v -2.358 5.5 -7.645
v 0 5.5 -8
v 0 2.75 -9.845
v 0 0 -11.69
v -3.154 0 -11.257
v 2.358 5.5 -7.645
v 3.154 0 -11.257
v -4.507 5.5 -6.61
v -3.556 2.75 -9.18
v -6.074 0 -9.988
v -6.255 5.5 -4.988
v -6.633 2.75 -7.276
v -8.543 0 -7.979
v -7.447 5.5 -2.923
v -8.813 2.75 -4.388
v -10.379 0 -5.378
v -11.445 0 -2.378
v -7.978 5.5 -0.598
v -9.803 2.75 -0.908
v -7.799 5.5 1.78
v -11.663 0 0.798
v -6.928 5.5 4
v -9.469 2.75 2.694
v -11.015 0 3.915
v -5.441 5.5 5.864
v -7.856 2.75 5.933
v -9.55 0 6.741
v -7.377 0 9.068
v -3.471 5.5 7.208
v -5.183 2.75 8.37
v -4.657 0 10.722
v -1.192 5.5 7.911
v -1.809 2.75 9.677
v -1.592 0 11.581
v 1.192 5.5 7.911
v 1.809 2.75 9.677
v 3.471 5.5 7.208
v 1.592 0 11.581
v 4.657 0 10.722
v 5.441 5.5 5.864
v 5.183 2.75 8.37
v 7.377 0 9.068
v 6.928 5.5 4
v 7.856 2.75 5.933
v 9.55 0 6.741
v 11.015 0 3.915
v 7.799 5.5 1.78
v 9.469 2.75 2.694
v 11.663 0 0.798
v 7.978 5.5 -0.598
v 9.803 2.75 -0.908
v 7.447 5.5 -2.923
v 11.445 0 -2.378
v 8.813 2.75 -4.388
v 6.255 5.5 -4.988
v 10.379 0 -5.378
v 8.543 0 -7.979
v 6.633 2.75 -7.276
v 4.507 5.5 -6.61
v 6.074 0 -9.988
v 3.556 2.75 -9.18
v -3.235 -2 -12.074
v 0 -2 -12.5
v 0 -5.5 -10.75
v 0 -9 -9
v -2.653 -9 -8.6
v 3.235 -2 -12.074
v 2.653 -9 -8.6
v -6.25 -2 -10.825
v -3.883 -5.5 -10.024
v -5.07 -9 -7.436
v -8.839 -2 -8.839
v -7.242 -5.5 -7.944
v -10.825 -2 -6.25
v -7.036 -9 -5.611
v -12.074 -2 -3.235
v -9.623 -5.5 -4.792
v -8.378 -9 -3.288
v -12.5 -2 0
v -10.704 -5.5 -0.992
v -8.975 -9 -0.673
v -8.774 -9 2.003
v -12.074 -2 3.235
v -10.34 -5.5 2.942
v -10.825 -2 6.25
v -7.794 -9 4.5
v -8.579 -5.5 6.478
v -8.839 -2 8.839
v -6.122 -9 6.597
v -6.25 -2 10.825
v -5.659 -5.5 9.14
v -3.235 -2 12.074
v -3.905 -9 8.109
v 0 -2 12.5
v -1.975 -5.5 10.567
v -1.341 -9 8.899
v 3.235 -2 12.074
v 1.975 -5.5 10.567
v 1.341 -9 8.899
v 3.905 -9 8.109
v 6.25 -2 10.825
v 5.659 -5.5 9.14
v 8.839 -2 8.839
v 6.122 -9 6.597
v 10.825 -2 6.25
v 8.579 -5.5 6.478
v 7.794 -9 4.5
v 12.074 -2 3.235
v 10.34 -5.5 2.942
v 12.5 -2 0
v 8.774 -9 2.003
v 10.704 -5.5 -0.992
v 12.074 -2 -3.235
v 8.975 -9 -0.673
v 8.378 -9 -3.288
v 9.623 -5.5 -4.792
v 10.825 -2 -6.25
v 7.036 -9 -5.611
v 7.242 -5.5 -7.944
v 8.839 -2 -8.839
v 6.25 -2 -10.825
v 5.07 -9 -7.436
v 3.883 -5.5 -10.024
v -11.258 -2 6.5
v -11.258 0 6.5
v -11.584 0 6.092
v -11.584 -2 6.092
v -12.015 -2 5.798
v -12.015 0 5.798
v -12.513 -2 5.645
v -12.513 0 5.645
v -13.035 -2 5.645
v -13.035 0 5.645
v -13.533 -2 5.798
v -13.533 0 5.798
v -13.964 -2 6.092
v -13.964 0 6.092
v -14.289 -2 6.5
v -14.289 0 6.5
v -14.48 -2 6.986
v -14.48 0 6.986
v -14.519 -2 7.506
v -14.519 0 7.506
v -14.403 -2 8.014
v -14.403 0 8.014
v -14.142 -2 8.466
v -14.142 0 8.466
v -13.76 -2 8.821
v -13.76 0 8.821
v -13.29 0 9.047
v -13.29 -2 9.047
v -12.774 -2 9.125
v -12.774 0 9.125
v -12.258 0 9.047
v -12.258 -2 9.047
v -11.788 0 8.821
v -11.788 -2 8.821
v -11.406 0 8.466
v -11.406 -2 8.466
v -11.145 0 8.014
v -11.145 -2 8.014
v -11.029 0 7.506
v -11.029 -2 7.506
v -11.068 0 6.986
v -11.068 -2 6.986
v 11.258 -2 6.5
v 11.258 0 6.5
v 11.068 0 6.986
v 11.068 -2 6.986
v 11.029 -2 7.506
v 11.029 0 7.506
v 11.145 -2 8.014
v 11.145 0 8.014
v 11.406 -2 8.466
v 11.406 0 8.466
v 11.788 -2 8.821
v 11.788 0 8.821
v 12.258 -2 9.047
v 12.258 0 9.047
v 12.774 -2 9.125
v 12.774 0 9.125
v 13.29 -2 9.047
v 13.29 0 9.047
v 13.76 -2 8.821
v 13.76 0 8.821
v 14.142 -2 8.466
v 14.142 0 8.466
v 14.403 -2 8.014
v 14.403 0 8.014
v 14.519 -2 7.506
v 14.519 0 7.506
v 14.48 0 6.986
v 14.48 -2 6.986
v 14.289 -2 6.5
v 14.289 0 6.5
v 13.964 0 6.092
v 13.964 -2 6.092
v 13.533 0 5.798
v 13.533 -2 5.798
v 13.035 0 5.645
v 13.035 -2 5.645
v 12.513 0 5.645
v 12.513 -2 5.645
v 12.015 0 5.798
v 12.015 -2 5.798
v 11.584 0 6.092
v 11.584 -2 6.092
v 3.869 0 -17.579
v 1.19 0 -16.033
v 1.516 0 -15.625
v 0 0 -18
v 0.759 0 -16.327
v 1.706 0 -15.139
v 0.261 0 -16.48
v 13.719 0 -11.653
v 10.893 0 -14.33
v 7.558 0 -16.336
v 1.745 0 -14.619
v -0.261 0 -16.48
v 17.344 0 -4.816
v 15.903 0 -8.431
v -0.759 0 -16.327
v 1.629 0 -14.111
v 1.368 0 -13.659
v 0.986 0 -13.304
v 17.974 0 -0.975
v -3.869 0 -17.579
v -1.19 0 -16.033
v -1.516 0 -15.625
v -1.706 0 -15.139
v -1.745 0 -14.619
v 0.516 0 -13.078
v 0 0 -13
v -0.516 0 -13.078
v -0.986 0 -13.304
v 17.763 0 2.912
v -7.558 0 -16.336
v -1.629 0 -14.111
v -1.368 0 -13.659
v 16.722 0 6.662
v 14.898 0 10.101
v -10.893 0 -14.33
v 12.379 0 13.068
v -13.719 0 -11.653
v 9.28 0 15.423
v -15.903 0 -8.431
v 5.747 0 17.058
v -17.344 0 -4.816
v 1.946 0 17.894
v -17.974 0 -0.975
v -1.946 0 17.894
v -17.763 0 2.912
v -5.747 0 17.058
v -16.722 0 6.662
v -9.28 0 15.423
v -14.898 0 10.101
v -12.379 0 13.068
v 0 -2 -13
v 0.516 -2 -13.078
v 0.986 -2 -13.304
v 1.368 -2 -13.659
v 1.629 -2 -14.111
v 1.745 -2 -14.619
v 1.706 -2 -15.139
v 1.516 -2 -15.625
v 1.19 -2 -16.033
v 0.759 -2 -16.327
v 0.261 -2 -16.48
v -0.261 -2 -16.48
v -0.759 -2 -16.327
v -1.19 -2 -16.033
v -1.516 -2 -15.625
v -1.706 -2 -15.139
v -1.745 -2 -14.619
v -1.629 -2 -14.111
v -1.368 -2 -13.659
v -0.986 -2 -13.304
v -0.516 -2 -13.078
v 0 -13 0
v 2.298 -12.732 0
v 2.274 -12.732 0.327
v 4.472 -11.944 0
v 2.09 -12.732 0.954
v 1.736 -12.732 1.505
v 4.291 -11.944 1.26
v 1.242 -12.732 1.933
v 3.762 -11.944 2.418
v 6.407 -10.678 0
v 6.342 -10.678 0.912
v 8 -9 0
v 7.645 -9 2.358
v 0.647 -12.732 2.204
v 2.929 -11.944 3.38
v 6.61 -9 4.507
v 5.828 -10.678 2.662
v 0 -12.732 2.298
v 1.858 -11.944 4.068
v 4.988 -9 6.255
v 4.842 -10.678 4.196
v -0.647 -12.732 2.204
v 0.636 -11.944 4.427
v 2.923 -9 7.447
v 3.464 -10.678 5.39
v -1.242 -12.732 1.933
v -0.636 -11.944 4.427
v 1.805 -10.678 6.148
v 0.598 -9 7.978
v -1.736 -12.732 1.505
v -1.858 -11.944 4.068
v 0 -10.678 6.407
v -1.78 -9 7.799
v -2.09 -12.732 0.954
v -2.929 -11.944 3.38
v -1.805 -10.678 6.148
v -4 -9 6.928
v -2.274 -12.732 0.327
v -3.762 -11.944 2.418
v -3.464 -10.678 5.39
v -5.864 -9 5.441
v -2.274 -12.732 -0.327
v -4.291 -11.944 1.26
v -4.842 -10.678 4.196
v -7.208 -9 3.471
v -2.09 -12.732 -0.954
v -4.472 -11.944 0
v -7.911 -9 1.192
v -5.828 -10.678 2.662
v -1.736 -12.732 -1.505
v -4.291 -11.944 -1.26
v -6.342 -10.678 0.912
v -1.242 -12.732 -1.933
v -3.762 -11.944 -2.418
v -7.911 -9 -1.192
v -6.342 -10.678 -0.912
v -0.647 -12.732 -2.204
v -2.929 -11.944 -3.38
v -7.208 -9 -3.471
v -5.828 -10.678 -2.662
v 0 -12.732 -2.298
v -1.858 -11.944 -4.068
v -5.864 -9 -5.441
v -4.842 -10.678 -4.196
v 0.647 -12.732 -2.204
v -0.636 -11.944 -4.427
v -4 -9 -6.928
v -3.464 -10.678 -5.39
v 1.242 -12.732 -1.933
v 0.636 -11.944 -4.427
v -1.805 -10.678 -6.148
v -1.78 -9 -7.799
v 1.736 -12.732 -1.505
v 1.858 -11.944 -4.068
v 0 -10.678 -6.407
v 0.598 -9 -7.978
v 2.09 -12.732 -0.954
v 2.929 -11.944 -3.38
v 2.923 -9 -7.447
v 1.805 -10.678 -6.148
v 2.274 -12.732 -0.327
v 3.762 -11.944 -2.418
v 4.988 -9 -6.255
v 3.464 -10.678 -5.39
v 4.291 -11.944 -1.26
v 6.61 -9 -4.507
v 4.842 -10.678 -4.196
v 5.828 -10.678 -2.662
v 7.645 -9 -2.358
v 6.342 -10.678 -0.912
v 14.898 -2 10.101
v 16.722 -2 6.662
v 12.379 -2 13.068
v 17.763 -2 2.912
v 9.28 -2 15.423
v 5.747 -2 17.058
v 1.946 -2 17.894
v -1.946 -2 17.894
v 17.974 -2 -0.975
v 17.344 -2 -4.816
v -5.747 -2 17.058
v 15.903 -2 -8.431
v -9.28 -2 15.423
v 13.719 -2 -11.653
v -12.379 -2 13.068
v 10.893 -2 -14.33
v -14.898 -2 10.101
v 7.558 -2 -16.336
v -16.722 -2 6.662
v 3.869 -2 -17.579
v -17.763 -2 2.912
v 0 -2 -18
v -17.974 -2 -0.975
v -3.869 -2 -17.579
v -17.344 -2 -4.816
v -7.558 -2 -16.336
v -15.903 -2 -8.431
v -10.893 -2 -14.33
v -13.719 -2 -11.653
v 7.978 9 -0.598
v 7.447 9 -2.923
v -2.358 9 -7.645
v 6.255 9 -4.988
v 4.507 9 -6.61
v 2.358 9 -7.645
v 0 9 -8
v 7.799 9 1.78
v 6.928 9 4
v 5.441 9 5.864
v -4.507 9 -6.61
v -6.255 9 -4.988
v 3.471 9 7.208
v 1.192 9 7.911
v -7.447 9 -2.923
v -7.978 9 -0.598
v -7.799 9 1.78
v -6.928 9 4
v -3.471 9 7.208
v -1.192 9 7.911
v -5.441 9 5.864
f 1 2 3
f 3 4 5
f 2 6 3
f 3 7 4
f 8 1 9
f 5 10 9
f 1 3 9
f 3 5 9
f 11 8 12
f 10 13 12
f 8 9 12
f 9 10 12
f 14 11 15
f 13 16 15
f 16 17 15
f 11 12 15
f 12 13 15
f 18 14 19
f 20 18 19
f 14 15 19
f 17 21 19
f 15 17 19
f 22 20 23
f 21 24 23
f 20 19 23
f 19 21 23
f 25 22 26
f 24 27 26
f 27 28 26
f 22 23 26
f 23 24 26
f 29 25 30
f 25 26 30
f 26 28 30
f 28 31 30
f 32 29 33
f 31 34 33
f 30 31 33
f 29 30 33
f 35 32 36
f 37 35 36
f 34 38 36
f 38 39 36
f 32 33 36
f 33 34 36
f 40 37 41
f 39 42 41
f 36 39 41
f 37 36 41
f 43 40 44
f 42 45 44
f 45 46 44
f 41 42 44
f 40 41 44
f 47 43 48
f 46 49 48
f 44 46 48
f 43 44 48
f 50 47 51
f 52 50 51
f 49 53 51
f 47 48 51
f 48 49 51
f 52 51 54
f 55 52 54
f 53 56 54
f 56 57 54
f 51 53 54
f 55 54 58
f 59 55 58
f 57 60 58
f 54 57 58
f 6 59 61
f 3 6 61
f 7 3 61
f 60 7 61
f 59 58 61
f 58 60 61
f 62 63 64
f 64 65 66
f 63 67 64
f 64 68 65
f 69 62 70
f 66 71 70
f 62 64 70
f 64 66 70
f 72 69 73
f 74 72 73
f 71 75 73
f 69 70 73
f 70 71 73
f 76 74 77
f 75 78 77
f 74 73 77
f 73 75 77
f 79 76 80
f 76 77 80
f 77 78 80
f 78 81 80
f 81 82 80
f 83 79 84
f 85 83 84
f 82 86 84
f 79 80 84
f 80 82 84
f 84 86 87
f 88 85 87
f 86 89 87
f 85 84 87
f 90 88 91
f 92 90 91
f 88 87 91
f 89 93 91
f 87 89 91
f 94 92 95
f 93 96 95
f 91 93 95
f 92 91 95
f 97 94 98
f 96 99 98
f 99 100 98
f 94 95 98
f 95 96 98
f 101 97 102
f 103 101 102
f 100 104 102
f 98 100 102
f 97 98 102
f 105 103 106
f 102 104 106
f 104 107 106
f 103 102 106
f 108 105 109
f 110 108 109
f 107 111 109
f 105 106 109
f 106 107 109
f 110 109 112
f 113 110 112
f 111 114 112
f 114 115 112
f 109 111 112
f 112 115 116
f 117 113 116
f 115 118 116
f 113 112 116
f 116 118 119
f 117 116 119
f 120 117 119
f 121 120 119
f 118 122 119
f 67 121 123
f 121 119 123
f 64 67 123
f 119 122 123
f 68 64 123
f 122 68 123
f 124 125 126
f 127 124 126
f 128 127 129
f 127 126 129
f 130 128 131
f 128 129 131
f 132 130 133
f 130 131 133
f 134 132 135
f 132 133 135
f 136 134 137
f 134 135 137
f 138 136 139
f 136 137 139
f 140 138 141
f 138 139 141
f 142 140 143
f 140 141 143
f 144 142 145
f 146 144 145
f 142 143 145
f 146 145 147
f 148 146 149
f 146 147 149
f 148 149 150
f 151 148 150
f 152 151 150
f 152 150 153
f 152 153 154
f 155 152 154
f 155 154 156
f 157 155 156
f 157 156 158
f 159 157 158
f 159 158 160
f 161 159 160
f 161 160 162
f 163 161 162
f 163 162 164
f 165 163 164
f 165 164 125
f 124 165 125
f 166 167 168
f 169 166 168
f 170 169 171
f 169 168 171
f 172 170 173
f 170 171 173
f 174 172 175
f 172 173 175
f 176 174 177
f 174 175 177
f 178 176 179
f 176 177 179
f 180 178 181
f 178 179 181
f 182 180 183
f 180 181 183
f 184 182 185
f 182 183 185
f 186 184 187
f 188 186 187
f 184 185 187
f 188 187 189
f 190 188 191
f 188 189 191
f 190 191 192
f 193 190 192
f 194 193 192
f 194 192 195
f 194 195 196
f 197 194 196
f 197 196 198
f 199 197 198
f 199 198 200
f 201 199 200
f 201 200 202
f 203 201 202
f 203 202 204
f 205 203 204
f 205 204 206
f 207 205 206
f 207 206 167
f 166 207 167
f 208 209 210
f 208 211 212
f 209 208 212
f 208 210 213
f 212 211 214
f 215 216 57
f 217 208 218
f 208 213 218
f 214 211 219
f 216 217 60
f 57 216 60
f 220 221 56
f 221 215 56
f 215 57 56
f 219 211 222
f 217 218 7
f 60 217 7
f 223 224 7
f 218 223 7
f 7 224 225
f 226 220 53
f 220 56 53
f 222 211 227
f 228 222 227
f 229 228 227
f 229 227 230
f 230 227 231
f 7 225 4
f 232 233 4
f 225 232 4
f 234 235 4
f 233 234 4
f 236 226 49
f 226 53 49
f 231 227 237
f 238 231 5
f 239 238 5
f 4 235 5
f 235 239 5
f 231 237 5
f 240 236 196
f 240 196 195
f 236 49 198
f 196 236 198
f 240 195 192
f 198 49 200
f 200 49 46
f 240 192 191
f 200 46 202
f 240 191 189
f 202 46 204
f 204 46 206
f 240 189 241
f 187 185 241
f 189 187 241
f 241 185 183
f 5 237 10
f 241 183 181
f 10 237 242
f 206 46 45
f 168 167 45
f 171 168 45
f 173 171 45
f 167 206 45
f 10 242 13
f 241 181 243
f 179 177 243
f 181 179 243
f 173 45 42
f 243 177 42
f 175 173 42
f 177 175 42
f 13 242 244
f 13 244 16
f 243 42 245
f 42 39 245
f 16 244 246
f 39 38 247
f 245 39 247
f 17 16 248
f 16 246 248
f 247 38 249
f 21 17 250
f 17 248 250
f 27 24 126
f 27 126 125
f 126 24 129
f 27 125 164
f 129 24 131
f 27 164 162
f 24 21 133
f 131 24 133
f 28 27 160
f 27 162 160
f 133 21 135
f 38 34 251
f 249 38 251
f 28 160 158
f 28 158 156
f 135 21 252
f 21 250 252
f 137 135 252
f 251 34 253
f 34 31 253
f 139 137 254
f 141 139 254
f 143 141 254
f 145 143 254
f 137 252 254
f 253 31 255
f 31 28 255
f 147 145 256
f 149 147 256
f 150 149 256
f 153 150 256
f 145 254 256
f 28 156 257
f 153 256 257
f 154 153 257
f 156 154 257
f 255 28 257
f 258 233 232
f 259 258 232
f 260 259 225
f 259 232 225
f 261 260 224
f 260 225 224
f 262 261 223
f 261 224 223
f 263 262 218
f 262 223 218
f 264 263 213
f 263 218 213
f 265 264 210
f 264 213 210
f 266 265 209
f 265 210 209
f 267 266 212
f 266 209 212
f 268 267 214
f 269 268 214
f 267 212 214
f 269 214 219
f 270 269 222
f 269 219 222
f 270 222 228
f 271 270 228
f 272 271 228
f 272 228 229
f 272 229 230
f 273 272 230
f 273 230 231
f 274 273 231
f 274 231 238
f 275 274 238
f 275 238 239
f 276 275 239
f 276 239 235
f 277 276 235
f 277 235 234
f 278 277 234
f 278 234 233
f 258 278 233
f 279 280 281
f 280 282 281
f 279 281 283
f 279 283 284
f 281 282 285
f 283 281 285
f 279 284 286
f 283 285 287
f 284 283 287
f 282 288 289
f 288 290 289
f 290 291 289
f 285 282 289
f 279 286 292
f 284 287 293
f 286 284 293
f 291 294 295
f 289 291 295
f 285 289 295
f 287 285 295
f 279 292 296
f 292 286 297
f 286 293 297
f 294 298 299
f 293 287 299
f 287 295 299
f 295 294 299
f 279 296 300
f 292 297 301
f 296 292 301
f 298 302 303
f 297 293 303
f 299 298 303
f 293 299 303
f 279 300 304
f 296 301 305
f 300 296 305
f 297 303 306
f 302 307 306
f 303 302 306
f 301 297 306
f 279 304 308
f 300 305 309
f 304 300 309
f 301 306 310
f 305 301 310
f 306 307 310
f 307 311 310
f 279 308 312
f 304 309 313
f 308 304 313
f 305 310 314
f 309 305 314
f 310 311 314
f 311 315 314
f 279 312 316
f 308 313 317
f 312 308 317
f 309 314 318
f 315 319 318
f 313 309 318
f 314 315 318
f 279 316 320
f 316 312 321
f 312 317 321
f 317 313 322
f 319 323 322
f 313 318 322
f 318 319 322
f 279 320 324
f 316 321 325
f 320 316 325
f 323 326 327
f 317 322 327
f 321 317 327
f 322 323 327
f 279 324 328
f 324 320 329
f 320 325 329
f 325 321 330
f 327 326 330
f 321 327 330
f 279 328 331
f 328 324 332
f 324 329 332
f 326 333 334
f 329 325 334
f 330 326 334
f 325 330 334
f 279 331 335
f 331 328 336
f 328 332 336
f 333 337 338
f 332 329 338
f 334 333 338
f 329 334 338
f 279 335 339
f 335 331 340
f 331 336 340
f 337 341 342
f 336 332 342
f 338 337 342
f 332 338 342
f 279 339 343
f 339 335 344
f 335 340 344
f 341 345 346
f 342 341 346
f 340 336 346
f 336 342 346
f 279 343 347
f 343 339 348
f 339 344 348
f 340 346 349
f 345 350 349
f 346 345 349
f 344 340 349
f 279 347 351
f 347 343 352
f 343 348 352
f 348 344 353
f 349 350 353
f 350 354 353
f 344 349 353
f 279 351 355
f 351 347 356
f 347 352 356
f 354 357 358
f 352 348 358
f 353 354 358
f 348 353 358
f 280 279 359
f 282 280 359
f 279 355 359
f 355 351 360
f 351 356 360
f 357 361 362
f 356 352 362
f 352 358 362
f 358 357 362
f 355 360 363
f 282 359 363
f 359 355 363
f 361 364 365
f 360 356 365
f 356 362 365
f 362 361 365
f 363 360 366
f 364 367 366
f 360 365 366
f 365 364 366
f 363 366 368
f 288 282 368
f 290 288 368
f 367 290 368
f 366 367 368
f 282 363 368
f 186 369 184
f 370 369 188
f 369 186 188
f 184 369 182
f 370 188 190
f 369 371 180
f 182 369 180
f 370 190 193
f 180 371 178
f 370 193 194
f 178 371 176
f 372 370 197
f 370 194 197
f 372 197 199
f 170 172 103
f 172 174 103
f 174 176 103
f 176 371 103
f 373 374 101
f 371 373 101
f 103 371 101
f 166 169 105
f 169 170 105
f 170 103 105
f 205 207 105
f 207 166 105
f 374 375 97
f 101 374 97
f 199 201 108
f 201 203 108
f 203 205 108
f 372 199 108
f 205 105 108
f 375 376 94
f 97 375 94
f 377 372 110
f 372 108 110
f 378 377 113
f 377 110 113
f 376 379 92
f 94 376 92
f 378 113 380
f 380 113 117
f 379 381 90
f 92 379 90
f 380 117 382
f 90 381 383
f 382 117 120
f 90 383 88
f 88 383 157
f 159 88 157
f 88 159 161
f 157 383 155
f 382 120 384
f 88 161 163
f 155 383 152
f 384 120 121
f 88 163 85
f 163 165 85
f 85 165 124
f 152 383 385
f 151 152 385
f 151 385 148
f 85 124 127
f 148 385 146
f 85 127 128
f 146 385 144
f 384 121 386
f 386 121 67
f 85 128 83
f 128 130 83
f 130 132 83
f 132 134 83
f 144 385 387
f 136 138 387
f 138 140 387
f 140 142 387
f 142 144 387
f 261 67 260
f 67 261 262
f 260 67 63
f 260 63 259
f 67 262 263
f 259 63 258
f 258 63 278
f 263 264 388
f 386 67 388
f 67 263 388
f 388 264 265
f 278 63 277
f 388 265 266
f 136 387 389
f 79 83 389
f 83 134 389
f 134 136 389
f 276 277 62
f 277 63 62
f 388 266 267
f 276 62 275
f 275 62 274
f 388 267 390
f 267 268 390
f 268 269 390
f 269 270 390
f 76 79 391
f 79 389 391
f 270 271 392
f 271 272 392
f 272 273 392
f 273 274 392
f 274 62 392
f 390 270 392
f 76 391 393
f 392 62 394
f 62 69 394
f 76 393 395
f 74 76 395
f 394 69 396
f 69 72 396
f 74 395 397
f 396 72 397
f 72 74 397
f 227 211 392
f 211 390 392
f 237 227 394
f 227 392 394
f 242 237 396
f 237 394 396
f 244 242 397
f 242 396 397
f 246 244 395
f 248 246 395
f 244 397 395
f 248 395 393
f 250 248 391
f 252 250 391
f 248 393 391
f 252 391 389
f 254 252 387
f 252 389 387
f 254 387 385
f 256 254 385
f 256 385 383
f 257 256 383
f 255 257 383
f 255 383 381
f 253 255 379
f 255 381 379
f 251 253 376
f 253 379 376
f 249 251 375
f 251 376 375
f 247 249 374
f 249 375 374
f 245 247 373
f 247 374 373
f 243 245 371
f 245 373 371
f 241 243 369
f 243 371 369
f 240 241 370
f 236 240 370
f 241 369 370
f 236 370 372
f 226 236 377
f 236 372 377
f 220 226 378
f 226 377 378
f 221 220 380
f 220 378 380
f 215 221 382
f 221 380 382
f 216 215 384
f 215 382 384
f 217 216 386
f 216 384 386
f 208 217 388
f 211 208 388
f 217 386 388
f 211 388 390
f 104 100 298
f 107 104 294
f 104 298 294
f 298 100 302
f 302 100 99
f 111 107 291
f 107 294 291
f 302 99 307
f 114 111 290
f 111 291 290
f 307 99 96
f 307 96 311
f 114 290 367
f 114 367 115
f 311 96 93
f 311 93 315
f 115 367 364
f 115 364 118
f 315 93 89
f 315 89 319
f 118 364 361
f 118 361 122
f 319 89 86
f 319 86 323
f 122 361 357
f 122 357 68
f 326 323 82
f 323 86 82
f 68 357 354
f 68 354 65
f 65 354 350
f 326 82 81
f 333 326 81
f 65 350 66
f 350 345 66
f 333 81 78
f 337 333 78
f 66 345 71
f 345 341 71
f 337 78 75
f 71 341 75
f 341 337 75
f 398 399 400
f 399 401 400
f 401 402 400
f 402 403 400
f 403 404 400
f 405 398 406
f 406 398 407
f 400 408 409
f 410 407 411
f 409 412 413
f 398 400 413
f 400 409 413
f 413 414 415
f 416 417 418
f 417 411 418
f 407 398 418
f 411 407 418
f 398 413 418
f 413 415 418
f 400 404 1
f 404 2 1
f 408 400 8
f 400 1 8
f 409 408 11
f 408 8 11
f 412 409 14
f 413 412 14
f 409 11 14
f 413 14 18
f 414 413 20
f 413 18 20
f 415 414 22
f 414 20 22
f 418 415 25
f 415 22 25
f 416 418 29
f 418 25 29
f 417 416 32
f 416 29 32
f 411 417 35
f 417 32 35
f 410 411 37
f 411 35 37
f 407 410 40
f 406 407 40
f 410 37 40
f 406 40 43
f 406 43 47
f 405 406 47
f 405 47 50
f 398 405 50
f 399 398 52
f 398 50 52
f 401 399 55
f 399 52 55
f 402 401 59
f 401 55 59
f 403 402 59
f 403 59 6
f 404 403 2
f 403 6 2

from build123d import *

# Parameters (mm, degrees)
ESQUISSE3_R                  = 1.75
ENL_V_MAT_EXTRU_1_DEPTH      = 29.583211856
R_P_TITION_CIRCULAIRE1_COUNT = 3


with BuildPart() as part:
    # Esquisse1 → Révolution1 (revolve)
    with BuildSketch(Plane.XY):
        Polygon((0, 0), (0, 9), (8, 9), (8, 5.5), (11.69, 0), (18, 0), (18, -2), (12.5, -2), (9, -9), (0, -9), align=None)
    revolve(axis=Axis((0, 0, 0), (0, 1, 0)))

    # Esquisse2 → Révolution2 (revolve)
    with BuildSketch(Plane.XY):
        with BuildLine():
            Line((0, 7), (0, -13))
            ThreePointArc((0, -13), (10, -3), (0, 7))
        make_face()
    revolve(axis=Axis((0, 7, 0), (0, -1, 0)))

    # Esquisse3 → Enlèv. mat.-Extru.1 (cut, through all)
    with BuildSketch(Plane(origin=(0, 0, 0), x_dir=(1, 0, 0), z_dir=(0, 1, 0))):
        with Locations((0, 14.75)):
            Circle(ESQUISSE3_R)
    enl_v_mat_extru_1 = extrude(amount=-ENL_V_MAT_EXTRU_1_DEPTH, mode=Mode.SUBTRACT)

    # Répétition circulaire1: Enlèv. mat.-Extru.1 ×3 about axis
    r_p_tition_circulaire1_axis = Axis((0, -14.1, 0), (0, 1, 0))
    for i in range(1, R_P_TITION_CIRCULAIRE1_COUNT):
        add(enl_v_mat_extru_1.rotate(r_p_tition_circulaire1_axis, i * 360 / R_P_TITION_CIRCULAIRE1_COUNT), mode=Mode.SUBTRACT)


solid = part.part
